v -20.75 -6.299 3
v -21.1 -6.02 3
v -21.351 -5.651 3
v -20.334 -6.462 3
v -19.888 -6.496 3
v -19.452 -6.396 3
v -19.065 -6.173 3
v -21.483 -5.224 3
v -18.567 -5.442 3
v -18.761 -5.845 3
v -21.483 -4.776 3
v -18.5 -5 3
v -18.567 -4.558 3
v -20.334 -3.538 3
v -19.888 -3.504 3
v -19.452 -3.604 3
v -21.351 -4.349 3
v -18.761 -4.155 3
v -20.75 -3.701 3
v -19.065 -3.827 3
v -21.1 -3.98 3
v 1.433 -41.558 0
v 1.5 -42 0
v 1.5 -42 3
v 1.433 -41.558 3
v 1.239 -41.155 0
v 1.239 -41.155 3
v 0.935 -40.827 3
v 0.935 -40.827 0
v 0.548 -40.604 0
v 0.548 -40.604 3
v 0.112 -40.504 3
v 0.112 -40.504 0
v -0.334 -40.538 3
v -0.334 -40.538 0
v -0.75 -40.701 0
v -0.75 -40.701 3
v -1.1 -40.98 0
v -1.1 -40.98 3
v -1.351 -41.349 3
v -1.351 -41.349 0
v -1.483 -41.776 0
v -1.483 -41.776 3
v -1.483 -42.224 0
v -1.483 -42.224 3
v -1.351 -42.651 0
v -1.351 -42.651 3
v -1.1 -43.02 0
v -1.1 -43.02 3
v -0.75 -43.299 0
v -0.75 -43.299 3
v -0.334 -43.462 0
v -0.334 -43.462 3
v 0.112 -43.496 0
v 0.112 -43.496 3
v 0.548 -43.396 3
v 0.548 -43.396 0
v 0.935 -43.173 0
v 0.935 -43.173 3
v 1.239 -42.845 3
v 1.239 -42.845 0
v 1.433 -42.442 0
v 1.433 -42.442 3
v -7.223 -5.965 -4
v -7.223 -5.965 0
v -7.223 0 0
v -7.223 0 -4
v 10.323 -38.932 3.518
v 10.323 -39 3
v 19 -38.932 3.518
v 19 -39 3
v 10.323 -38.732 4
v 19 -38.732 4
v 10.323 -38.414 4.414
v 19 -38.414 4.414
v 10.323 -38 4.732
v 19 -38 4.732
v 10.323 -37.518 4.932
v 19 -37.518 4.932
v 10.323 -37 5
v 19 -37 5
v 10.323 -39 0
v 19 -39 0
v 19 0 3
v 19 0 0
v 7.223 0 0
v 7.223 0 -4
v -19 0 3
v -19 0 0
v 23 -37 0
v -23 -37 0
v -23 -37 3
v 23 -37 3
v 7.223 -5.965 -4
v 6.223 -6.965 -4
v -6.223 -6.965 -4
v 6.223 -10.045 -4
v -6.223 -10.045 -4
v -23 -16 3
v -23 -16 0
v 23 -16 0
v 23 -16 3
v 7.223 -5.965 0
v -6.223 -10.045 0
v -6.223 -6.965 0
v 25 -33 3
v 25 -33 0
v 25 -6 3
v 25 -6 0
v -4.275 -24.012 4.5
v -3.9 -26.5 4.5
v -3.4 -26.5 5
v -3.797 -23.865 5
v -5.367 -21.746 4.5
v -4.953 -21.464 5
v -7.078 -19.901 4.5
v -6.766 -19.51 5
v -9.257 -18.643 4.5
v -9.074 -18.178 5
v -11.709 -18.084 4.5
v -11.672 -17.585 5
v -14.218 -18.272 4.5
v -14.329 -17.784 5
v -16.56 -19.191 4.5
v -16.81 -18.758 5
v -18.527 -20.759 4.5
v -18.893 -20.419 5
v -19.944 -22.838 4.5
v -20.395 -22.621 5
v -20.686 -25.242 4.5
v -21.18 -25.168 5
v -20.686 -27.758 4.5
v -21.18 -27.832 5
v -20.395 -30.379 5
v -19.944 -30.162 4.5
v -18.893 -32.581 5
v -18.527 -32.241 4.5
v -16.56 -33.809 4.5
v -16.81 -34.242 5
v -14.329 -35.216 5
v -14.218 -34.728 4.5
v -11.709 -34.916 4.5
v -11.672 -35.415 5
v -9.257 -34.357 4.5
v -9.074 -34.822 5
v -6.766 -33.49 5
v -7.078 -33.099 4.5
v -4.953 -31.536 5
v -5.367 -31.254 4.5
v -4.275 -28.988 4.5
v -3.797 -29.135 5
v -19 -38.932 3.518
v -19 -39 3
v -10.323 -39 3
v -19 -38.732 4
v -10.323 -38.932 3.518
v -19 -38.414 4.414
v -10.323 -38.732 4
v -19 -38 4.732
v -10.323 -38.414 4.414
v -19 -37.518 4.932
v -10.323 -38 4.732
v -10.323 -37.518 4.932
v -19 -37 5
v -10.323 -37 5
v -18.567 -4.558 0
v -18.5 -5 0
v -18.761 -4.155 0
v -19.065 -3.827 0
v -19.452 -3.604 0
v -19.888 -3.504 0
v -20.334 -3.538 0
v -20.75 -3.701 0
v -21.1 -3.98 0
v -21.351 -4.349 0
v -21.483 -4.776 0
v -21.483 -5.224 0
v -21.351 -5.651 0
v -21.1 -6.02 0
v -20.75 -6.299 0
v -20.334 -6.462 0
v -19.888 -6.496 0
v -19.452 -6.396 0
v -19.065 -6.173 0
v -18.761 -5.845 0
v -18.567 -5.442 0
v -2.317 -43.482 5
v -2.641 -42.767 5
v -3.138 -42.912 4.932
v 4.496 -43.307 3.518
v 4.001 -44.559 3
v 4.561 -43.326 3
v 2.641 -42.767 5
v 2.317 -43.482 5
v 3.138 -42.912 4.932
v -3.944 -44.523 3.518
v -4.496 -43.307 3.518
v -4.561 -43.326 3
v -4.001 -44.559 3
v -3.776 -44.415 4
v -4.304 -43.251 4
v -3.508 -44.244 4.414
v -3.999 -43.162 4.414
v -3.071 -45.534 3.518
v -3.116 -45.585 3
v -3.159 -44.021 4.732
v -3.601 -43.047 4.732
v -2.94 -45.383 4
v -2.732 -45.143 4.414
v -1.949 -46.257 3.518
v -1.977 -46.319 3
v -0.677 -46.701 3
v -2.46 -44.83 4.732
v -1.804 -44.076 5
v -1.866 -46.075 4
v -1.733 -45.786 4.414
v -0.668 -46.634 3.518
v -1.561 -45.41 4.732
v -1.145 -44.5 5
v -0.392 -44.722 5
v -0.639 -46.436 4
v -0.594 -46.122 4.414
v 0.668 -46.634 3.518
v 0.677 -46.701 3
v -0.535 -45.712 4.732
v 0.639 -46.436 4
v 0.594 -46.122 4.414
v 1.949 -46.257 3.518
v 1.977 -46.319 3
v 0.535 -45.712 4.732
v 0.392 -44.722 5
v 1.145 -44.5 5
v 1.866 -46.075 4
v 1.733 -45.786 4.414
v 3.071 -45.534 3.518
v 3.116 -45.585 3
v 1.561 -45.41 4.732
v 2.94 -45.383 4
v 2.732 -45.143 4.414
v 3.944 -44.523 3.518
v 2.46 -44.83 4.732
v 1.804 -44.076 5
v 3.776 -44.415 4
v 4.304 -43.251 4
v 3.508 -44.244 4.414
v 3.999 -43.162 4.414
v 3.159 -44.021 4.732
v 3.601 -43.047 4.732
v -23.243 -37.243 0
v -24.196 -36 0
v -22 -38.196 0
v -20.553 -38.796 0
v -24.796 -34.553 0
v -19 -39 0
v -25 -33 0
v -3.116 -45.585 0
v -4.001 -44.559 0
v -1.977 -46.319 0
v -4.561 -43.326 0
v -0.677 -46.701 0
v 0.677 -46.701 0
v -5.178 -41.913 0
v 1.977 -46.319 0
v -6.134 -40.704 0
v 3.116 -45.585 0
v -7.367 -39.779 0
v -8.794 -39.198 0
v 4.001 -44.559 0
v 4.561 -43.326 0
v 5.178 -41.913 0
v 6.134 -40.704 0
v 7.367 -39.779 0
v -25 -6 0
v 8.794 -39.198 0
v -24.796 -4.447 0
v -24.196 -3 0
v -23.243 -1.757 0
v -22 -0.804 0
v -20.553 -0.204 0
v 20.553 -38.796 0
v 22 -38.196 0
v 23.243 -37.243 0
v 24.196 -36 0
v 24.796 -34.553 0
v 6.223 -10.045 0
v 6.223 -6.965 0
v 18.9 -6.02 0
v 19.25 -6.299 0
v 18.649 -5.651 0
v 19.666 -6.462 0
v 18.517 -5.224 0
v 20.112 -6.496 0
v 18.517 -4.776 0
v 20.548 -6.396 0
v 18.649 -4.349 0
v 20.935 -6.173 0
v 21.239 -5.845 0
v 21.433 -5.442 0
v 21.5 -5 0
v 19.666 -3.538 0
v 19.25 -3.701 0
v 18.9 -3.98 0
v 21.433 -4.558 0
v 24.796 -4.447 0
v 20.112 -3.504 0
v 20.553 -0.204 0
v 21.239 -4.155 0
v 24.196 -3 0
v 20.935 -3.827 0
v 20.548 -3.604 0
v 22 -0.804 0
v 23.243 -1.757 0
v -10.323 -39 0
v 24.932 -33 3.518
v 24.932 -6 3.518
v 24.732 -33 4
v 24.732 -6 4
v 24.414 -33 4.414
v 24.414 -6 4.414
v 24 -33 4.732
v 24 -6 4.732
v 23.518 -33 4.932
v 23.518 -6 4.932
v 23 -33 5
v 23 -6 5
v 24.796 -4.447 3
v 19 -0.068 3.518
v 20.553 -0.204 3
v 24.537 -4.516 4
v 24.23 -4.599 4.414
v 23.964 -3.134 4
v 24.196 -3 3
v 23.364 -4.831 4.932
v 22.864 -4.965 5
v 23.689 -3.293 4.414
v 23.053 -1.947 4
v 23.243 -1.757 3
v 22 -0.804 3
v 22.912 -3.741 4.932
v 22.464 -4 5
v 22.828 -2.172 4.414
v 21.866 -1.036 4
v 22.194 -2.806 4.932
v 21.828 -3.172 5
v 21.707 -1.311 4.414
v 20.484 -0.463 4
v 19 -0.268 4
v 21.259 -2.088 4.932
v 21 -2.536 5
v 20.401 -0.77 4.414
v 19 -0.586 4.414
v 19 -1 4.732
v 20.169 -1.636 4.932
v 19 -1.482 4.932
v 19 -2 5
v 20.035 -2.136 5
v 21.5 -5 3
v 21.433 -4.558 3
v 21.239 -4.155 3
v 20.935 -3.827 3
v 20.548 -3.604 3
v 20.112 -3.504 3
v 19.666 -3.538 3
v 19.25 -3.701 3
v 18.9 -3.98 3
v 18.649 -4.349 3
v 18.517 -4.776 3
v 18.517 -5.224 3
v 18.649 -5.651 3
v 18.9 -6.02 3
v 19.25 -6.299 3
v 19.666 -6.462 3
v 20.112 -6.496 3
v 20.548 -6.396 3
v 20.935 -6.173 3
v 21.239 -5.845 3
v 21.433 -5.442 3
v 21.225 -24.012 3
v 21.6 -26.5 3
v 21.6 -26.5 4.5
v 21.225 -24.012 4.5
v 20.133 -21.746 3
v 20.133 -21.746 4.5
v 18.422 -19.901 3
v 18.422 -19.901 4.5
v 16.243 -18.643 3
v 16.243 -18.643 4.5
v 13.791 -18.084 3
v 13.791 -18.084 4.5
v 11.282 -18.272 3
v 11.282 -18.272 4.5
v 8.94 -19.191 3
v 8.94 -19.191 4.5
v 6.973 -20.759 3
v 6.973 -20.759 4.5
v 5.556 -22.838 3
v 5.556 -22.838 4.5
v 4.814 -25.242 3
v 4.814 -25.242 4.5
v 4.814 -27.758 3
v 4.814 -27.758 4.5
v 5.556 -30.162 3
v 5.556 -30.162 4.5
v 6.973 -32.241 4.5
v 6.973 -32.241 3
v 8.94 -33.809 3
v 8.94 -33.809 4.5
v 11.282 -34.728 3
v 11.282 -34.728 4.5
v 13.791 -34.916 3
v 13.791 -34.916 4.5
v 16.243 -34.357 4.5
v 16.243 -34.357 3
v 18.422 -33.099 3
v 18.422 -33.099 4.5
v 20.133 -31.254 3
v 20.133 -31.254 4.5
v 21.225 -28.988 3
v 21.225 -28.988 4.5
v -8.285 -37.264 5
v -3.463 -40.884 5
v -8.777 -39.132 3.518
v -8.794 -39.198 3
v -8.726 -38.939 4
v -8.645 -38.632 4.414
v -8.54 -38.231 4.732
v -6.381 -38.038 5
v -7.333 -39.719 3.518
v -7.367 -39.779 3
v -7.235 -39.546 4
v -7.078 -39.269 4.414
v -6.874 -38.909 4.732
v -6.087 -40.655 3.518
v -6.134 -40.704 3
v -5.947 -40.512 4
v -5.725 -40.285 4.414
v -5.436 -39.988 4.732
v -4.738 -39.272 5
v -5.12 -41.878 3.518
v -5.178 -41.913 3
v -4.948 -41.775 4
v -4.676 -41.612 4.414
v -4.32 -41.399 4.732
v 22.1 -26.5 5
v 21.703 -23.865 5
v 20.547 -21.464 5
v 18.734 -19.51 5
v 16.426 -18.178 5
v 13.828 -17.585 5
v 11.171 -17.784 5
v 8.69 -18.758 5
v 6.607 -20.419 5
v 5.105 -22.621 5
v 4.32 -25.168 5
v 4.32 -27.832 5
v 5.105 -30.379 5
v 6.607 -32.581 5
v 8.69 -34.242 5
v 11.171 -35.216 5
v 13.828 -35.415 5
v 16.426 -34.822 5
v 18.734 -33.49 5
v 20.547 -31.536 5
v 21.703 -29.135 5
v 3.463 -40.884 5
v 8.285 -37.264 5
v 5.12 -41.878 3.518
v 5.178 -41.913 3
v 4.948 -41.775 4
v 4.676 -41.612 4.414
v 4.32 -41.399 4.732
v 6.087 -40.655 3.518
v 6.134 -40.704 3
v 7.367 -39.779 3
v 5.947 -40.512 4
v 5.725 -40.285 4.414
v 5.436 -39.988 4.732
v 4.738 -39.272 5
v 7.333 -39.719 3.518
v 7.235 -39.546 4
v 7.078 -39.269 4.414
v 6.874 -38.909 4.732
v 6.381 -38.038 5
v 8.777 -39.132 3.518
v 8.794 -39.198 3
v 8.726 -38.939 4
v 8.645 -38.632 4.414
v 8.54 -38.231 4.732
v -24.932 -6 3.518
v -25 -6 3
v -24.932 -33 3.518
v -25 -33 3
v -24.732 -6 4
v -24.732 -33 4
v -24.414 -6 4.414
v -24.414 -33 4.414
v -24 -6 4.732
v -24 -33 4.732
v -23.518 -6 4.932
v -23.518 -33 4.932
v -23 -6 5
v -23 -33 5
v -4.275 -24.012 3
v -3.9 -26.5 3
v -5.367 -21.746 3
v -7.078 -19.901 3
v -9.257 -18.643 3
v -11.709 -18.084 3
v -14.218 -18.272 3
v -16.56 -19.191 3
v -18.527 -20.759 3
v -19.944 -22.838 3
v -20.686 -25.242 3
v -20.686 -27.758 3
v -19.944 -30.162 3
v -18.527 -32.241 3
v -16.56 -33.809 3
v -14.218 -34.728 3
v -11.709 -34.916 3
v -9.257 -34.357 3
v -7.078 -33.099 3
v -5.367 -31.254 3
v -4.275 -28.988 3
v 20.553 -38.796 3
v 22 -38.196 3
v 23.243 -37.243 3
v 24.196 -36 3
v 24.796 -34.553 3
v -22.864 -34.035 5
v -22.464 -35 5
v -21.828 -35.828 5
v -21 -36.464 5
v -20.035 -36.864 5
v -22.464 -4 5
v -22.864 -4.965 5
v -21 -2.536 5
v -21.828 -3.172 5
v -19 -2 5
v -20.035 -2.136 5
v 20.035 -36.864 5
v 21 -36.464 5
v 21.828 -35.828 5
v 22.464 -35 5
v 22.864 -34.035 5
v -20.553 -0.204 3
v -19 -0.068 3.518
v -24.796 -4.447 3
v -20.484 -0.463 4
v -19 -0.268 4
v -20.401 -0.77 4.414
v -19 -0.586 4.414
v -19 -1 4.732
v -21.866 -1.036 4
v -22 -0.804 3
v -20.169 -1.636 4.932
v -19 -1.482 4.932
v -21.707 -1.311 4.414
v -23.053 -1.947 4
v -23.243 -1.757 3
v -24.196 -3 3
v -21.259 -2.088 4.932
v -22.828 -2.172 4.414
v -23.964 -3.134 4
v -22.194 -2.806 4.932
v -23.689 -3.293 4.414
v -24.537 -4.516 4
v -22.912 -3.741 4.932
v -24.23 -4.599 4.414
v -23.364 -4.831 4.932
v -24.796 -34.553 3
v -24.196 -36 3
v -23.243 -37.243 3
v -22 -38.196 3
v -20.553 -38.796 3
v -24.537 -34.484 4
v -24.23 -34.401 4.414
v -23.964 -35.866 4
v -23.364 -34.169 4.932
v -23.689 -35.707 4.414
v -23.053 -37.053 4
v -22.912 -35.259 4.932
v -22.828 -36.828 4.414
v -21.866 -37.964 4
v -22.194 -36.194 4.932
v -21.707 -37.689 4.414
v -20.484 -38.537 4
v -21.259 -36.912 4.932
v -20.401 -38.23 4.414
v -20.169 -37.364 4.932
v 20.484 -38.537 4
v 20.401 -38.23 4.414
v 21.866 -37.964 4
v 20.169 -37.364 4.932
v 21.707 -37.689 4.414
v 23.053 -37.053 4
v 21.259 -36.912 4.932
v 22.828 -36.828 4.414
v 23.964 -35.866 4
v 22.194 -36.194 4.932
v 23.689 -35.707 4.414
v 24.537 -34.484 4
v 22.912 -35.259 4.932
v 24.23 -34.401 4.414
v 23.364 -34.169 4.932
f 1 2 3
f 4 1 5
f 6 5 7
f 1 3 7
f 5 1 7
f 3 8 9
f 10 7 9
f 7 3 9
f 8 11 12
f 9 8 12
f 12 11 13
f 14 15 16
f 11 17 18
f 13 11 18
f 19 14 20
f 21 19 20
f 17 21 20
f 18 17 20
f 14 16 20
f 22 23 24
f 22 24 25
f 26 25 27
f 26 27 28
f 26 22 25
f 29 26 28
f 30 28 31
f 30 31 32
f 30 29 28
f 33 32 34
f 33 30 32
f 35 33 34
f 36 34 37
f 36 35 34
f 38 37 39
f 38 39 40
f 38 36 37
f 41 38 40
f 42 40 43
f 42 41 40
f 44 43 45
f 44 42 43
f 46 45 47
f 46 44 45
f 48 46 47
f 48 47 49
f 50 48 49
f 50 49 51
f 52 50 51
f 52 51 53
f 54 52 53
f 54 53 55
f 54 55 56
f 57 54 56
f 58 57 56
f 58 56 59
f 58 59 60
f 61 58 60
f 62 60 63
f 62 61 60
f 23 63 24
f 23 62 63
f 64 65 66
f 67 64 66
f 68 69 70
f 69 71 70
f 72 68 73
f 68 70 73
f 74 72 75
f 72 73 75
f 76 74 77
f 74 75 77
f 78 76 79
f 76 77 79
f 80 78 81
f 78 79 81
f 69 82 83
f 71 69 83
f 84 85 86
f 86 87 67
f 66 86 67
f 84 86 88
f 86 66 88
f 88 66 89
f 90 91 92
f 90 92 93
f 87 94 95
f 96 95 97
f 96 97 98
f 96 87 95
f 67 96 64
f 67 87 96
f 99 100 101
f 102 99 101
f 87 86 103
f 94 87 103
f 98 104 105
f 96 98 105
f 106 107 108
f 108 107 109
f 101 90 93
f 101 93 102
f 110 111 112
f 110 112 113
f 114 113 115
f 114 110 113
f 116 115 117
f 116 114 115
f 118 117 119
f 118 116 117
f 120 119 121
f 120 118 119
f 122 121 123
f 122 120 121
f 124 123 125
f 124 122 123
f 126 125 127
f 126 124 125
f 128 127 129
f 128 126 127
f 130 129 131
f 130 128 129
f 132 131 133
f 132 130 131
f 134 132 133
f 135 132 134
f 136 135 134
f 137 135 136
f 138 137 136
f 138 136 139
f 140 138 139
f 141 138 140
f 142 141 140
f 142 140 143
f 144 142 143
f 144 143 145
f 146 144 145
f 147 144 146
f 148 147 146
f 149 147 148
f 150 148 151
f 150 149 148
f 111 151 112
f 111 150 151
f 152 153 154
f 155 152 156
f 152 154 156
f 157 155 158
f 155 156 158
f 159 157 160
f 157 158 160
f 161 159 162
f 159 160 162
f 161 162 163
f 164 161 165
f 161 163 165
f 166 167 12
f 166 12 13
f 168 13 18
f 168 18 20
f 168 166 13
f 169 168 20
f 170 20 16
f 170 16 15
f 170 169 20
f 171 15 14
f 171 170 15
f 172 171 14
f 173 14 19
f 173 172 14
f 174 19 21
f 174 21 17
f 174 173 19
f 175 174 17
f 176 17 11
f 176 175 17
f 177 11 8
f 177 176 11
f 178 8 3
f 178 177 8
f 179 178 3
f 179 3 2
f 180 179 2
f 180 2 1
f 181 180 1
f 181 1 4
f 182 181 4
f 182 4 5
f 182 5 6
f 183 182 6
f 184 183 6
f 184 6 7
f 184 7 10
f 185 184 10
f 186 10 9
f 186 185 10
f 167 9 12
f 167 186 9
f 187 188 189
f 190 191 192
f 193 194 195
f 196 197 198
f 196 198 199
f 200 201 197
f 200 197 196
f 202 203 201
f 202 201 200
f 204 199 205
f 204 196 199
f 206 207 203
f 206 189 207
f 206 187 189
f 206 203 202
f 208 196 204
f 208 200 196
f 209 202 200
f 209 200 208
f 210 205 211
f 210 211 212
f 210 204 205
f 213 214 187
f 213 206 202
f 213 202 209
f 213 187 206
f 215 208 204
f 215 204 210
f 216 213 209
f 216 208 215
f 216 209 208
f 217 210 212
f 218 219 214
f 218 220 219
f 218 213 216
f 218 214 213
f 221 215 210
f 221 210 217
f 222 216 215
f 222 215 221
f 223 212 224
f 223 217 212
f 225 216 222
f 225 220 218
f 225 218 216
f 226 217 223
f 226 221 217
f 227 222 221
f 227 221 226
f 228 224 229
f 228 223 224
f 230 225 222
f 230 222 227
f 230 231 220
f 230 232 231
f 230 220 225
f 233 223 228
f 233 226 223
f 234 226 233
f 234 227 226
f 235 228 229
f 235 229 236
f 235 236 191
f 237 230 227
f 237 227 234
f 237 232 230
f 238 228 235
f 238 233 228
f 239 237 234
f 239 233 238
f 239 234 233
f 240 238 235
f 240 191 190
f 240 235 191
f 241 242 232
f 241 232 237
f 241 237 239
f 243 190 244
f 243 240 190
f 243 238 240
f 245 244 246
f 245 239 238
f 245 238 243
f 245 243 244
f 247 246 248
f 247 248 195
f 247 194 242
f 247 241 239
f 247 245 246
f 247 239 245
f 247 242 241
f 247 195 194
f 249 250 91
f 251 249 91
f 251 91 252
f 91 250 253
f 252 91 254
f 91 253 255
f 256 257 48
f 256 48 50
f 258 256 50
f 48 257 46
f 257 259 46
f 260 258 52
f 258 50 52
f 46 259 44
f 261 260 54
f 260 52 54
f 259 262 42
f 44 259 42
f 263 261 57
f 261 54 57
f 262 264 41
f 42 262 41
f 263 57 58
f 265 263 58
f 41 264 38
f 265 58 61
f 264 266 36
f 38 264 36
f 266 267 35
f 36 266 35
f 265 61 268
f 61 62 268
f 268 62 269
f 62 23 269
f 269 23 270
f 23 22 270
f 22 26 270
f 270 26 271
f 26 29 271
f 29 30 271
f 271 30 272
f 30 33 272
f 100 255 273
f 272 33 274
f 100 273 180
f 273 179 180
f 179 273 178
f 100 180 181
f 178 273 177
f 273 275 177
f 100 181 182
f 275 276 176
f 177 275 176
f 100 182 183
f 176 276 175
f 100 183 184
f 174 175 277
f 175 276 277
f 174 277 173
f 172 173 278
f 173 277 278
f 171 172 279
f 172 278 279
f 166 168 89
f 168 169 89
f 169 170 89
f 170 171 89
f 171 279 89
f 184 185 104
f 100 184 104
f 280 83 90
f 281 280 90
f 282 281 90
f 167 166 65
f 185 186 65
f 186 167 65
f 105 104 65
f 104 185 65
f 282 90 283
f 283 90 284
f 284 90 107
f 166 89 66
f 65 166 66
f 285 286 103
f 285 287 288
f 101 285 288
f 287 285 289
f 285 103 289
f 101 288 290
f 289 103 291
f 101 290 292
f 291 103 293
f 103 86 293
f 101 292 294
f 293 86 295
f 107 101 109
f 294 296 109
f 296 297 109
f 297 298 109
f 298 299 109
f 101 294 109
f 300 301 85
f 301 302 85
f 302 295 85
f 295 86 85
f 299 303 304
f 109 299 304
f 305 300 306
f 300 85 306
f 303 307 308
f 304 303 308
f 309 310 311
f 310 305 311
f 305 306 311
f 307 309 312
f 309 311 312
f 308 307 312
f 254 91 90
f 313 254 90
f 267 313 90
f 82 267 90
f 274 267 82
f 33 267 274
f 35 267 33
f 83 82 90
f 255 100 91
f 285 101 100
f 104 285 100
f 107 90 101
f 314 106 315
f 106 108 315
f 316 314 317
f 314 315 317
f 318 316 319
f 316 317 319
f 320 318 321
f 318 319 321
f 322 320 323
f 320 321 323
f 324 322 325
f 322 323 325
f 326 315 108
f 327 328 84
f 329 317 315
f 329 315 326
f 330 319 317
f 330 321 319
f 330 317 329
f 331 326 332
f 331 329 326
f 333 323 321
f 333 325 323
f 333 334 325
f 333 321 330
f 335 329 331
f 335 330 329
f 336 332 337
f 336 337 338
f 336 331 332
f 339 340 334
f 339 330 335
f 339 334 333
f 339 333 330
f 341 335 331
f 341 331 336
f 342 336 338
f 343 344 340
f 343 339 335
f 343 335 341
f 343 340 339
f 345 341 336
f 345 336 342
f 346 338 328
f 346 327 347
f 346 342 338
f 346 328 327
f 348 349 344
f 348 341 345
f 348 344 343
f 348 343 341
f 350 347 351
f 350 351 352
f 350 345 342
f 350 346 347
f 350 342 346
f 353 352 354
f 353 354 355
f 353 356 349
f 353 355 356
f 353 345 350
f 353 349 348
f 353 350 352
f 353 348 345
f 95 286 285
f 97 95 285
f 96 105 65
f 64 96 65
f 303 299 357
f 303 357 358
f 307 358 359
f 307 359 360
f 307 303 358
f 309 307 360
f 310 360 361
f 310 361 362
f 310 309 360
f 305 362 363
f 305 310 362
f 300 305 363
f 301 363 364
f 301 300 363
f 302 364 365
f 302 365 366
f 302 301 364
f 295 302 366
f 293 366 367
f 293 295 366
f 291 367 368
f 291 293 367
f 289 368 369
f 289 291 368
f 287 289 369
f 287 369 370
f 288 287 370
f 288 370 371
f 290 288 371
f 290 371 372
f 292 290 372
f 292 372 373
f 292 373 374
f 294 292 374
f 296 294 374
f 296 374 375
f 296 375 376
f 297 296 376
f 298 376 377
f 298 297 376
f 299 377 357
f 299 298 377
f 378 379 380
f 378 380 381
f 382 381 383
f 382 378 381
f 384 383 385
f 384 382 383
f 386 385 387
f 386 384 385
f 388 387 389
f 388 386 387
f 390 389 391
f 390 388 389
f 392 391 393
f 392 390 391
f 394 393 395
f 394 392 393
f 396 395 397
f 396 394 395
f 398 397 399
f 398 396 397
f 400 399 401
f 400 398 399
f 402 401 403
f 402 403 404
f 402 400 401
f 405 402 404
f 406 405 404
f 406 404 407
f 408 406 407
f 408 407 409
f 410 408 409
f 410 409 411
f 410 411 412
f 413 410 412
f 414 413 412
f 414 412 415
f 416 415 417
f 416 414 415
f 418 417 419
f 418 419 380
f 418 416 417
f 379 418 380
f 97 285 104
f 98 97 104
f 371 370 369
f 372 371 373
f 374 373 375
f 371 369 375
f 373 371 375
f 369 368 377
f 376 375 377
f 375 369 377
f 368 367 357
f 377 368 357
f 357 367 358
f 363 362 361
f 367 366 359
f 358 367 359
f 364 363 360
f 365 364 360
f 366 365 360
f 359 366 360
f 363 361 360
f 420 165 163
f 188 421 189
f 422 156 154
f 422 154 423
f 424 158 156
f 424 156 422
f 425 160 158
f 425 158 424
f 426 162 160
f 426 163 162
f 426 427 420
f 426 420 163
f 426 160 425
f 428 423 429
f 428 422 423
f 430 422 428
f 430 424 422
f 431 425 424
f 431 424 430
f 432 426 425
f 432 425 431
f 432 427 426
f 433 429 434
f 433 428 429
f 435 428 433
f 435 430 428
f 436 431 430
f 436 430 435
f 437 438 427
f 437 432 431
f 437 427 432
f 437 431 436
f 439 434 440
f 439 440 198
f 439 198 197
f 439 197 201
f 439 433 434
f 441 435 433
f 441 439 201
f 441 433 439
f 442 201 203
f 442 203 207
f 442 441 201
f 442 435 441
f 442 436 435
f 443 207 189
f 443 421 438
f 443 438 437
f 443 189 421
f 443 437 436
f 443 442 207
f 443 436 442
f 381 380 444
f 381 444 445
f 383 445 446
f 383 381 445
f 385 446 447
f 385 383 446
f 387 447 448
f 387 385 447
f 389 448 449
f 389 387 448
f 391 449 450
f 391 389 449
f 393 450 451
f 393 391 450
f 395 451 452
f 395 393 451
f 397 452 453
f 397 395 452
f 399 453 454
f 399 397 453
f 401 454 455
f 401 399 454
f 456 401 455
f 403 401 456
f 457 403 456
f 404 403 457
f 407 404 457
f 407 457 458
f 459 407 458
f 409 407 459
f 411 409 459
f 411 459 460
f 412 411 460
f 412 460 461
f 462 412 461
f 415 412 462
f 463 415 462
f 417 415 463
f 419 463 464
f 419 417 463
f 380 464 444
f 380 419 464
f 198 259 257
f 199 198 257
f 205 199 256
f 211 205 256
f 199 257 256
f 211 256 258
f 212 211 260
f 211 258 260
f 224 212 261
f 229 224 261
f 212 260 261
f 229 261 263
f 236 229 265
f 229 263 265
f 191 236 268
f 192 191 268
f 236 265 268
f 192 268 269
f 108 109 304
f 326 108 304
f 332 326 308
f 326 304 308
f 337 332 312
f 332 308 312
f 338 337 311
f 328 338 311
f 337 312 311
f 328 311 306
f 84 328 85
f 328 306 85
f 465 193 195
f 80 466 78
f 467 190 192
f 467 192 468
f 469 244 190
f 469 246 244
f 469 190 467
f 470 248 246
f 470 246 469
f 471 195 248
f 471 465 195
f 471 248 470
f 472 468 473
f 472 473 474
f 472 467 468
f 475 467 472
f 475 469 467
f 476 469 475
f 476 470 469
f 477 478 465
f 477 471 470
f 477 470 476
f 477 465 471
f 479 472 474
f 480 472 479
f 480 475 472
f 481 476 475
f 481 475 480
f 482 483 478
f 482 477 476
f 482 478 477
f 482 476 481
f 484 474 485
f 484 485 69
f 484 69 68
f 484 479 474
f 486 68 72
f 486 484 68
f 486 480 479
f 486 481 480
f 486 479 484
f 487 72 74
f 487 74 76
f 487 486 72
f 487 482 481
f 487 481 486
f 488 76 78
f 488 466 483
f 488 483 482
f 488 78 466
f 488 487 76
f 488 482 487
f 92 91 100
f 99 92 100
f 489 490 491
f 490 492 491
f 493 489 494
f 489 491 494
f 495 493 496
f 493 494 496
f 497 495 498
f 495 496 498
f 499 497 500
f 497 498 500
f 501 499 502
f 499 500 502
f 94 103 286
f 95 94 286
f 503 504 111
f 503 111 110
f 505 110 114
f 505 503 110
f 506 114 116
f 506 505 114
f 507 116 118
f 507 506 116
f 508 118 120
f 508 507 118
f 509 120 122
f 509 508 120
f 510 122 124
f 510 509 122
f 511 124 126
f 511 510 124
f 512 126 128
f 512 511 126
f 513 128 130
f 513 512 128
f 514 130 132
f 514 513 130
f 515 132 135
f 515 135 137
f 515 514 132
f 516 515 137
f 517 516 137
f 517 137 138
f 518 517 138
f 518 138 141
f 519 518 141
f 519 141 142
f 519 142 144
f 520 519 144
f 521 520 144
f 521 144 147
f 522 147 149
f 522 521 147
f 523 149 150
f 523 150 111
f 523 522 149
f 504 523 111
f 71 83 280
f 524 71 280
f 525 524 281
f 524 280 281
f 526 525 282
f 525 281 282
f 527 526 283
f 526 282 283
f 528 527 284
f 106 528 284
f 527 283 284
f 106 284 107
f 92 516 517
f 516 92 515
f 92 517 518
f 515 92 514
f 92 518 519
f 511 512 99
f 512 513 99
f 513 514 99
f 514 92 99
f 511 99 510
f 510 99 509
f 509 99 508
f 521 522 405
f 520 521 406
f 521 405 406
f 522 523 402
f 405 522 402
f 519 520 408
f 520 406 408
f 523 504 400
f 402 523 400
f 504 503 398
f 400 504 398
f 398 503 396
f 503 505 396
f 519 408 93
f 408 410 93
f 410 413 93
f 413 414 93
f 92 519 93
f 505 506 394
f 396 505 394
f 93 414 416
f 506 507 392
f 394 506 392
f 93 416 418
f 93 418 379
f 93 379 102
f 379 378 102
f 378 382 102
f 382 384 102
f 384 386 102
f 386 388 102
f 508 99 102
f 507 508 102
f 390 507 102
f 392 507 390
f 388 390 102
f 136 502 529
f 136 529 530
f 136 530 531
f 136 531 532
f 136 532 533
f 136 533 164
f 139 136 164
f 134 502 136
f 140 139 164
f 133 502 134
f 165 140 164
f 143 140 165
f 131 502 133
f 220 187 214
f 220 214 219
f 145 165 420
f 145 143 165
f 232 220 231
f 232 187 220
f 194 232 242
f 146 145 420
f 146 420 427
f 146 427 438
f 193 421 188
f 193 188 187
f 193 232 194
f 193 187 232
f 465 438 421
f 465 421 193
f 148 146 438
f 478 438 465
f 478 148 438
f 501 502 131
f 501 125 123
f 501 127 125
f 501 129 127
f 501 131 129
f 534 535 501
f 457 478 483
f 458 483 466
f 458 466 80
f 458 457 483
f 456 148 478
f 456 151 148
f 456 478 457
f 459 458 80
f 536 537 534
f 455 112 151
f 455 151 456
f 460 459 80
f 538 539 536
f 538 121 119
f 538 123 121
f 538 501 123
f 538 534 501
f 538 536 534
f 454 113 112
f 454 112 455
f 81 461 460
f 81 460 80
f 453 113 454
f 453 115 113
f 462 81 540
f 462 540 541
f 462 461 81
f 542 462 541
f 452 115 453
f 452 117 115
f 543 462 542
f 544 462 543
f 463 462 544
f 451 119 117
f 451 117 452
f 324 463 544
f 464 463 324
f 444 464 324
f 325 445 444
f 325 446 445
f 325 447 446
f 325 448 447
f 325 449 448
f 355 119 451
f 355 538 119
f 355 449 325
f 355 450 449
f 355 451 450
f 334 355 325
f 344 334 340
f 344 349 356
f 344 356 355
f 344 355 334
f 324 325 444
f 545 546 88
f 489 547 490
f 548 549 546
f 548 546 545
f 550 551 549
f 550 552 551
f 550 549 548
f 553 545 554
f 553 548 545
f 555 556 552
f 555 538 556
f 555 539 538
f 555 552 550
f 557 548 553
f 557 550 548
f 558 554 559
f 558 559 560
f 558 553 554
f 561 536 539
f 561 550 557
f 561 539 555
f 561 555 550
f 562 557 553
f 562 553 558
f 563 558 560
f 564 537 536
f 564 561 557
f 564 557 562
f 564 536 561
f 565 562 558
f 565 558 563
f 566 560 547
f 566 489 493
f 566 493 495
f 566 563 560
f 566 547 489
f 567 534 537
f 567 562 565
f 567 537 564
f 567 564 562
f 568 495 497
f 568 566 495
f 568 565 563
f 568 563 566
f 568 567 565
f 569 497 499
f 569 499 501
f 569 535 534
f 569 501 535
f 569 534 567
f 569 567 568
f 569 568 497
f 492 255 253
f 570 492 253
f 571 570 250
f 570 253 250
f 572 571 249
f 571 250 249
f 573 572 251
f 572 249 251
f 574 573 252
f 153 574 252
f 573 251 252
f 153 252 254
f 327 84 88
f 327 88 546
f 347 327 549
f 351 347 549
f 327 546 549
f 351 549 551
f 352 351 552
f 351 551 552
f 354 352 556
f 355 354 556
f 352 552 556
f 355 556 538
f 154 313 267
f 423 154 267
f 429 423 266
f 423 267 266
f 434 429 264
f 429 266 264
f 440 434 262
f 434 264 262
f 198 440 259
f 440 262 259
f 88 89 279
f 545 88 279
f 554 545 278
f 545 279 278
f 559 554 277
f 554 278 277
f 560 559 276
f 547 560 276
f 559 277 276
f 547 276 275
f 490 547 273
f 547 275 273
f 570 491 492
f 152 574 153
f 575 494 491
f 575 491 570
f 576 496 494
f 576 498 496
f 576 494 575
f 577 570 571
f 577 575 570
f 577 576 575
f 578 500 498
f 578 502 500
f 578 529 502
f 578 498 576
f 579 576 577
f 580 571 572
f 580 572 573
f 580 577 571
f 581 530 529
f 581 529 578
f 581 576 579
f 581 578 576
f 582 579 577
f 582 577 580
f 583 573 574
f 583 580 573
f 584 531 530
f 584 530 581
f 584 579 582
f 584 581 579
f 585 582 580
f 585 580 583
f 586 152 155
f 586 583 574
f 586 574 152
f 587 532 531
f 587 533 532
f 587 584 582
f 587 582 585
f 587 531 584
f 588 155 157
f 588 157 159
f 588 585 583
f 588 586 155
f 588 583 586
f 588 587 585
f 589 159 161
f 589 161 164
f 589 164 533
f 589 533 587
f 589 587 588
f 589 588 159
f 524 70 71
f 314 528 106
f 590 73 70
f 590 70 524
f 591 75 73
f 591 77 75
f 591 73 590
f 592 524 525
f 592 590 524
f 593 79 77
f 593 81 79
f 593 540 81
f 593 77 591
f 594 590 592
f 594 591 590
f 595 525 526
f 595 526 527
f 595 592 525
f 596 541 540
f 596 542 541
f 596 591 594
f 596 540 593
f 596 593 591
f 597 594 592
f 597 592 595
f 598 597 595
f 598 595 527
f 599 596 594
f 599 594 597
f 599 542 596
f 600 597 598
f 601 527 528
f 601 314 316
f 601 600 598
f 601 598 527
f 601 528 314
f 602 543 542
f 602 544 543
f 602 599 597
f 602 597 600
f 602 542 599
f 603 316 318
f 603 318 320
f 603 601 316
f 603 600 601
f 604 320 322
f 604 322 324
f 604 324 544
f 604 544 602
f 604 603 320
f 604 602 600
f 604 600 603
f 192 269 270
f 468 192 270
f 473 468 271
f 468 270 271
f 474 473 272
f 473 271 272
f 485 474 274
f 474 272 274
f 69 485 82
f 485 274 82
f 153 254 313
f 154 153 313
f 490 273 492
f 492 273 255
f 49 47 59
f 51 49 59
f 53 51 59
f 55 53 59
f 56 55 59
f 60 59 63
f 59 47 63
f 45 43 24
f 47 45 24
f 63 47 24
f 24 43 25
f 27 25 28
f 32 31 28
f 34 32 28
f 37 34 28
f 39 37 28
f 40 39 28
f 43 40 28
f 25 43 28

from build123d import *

# Parameters (mm, degrees)
SKETCH1_W           = 46
SKETCH1_H           = 21
SKETCH1_R           = 1.5
BOSS_EXTRUDE1_DEPTH = 3
BOSS_EXTRUDE2_DEPTH = 4
SKETCH5_R           = 8.44
BOSS_EXTRUDE3_DEPTH = 2
FILLET3_R           = 2
CHAMFER1_SIZE       = 0.5


with BuildPart() as part:
    # Sketch1 → Boss-Extrude1 (new body)
    with BuildSketch(Plane.XY):
        with BuildLine():
            Line((19, 0), (-19, 0))
            ThreePointArc((-19, 0), (-23.242640687, -1.757359313), (-25, -6))
            Line((-25, -6), (-25, -33))
            ThreePointArc((-25, -33), (-23.242640687, -37.242640687), (-19, -39))
            Line((-19, -39), (-10.322911411, -39))
            ThreePointArc((-10.322911411, -39), (-6.72058658, -40.201744503), (-4.561286437, -43.325581395))
            ThreePointArc((-4.561286437, -43.325581395), (0, -46.75), (4.561286437, -43.325581395))
            ThreePointArc((4.561286437, -43.325581395), (6.72058658, -40.201744503), (10.322911411, -39))
            Line((10.322911411, -39), (19, -39))
            ThreePointArc((19, -39), (23.242640687, -37.242640687), (25, -33))
            Line((25, -33), (25, -6))
            ThreePointArc((25, -6), (23.242640687, -1.757359313), (19, 0))
        make_face()
        with Locations((0, -26.5)):
            Rectangle(SKETCH1_W, SKETCH1_H, mode=Mode.SUBTRACT)
        with Locations((0, -42)):
            Circle(SKETCH1_R, mode=Mode.SUBTRACT)
        with Locations((-20, -5)):
            Circle(SKETCH1_R, mode=Mode.SUBTRACT)
        with Locations((20, -5)):
            Circle(SKETCH1_R, mode=Mode.SUBTRACT)
    extrude(amount=BOSS_EXTRUDE1_DEPTH)

    # Sketch3 → Boss-Extrude2 (add)
    with BuildSketch(Plane(origin=(0, 0, 0), x_dir=(-1, 0, 0), z_dir=(0, 0, -1))):
        Polygon((-7.223, 0), (-7.223, -5.965393219), (-6.223, -6.965393219), (-6.223, -10.04450176), (6.223, -10.04450176), (6.223, -6.965393219), (7.223, -5.965393219), (7.223, 0), align=None)
    extrude(amount=BOSS_EXTRUDE2_DEPTH)

    # Sketch5 → Boss-Extrude3 (add)
    with BuildSketch(Plane.XY.offset(3)):
        with BuildLine():
            Line((19, 0), (-19, 0))
            ThreePointArc((-19, 0), (-23.242640687, -1.757359313), (-25, -6))
            Line((-25, -6), (-25, -33))
            ThreePointArc((-25, -33), (-23.242640687, -37.242640687), (-19, -39))
            Line((-19, -39), (-10.322911411, -39))
            ThreePointArc((-10.322911411, -39), (-6.72058658, -40.201744503), (-4.561286437, -43.325581395))
            ThreePointArc((-4.561286437, -43.325581395), (0, -46.75), (4.561286437, -43.325581395))
            ThreePointArc((4.561286437, -43.325581395), (6.72058658, -40.201744503), (10.322911411, -39))
            Line((10.322911411, -39), (19, -39))
            ThreePointArc((19, -39), (23.242640687, -37.242640687), (25, -33))
            Line((25, -33), (25, -6))
            ThreePointArc((25, -6), (23.242640687, -1.757359313), (19, 0))
        make_face()
        with Locations((13.16, -26.5)):
            Circle(SKETCH5_R, mode=Mode.SUBTRACT)
        with Locations((-12.34, -26.5)):
            Circle(SKETCH5_R, mode=Mode.SUBTRACT)
    extrude(amount=BOSS_EXTRUDE3_DEPTH)

    # Fillet3
    fillet3_edges = [part.edges().sort_by_distance(p)[0] for p in [
        (-6.72058658, -40.201744503, 5),
        (0, -46.75, 5),
        (6.72058658, -40.201744503, 5),
        (14.661455706, -39, 5),
        (23.242640687, -37.242640687, 5),
        (25, -19.5, 5),
        (23.242640687, -1.757359313, 5),
        (0, 0, 5),
        (-23.242640687, -1.757359313, 5),
        (-25, -19.5, 5),
        (-23.242640687, -37.242640687, 5),
        (-14.661455706, -39, 5),
    ]]
    fillet(fillet3_edges, radius=FILLET3_R)

    # Chamfer1
    chamfer1_edges = [part.edges().sort_by_distance(p)[0] for p in [
        (-20.78, -26.5, 5),
        (4.72, -26.5, 5),
    ]]
    chamfer(chamfer1_edges, length=CHAMFER1_SIZE)


solid = part.part
